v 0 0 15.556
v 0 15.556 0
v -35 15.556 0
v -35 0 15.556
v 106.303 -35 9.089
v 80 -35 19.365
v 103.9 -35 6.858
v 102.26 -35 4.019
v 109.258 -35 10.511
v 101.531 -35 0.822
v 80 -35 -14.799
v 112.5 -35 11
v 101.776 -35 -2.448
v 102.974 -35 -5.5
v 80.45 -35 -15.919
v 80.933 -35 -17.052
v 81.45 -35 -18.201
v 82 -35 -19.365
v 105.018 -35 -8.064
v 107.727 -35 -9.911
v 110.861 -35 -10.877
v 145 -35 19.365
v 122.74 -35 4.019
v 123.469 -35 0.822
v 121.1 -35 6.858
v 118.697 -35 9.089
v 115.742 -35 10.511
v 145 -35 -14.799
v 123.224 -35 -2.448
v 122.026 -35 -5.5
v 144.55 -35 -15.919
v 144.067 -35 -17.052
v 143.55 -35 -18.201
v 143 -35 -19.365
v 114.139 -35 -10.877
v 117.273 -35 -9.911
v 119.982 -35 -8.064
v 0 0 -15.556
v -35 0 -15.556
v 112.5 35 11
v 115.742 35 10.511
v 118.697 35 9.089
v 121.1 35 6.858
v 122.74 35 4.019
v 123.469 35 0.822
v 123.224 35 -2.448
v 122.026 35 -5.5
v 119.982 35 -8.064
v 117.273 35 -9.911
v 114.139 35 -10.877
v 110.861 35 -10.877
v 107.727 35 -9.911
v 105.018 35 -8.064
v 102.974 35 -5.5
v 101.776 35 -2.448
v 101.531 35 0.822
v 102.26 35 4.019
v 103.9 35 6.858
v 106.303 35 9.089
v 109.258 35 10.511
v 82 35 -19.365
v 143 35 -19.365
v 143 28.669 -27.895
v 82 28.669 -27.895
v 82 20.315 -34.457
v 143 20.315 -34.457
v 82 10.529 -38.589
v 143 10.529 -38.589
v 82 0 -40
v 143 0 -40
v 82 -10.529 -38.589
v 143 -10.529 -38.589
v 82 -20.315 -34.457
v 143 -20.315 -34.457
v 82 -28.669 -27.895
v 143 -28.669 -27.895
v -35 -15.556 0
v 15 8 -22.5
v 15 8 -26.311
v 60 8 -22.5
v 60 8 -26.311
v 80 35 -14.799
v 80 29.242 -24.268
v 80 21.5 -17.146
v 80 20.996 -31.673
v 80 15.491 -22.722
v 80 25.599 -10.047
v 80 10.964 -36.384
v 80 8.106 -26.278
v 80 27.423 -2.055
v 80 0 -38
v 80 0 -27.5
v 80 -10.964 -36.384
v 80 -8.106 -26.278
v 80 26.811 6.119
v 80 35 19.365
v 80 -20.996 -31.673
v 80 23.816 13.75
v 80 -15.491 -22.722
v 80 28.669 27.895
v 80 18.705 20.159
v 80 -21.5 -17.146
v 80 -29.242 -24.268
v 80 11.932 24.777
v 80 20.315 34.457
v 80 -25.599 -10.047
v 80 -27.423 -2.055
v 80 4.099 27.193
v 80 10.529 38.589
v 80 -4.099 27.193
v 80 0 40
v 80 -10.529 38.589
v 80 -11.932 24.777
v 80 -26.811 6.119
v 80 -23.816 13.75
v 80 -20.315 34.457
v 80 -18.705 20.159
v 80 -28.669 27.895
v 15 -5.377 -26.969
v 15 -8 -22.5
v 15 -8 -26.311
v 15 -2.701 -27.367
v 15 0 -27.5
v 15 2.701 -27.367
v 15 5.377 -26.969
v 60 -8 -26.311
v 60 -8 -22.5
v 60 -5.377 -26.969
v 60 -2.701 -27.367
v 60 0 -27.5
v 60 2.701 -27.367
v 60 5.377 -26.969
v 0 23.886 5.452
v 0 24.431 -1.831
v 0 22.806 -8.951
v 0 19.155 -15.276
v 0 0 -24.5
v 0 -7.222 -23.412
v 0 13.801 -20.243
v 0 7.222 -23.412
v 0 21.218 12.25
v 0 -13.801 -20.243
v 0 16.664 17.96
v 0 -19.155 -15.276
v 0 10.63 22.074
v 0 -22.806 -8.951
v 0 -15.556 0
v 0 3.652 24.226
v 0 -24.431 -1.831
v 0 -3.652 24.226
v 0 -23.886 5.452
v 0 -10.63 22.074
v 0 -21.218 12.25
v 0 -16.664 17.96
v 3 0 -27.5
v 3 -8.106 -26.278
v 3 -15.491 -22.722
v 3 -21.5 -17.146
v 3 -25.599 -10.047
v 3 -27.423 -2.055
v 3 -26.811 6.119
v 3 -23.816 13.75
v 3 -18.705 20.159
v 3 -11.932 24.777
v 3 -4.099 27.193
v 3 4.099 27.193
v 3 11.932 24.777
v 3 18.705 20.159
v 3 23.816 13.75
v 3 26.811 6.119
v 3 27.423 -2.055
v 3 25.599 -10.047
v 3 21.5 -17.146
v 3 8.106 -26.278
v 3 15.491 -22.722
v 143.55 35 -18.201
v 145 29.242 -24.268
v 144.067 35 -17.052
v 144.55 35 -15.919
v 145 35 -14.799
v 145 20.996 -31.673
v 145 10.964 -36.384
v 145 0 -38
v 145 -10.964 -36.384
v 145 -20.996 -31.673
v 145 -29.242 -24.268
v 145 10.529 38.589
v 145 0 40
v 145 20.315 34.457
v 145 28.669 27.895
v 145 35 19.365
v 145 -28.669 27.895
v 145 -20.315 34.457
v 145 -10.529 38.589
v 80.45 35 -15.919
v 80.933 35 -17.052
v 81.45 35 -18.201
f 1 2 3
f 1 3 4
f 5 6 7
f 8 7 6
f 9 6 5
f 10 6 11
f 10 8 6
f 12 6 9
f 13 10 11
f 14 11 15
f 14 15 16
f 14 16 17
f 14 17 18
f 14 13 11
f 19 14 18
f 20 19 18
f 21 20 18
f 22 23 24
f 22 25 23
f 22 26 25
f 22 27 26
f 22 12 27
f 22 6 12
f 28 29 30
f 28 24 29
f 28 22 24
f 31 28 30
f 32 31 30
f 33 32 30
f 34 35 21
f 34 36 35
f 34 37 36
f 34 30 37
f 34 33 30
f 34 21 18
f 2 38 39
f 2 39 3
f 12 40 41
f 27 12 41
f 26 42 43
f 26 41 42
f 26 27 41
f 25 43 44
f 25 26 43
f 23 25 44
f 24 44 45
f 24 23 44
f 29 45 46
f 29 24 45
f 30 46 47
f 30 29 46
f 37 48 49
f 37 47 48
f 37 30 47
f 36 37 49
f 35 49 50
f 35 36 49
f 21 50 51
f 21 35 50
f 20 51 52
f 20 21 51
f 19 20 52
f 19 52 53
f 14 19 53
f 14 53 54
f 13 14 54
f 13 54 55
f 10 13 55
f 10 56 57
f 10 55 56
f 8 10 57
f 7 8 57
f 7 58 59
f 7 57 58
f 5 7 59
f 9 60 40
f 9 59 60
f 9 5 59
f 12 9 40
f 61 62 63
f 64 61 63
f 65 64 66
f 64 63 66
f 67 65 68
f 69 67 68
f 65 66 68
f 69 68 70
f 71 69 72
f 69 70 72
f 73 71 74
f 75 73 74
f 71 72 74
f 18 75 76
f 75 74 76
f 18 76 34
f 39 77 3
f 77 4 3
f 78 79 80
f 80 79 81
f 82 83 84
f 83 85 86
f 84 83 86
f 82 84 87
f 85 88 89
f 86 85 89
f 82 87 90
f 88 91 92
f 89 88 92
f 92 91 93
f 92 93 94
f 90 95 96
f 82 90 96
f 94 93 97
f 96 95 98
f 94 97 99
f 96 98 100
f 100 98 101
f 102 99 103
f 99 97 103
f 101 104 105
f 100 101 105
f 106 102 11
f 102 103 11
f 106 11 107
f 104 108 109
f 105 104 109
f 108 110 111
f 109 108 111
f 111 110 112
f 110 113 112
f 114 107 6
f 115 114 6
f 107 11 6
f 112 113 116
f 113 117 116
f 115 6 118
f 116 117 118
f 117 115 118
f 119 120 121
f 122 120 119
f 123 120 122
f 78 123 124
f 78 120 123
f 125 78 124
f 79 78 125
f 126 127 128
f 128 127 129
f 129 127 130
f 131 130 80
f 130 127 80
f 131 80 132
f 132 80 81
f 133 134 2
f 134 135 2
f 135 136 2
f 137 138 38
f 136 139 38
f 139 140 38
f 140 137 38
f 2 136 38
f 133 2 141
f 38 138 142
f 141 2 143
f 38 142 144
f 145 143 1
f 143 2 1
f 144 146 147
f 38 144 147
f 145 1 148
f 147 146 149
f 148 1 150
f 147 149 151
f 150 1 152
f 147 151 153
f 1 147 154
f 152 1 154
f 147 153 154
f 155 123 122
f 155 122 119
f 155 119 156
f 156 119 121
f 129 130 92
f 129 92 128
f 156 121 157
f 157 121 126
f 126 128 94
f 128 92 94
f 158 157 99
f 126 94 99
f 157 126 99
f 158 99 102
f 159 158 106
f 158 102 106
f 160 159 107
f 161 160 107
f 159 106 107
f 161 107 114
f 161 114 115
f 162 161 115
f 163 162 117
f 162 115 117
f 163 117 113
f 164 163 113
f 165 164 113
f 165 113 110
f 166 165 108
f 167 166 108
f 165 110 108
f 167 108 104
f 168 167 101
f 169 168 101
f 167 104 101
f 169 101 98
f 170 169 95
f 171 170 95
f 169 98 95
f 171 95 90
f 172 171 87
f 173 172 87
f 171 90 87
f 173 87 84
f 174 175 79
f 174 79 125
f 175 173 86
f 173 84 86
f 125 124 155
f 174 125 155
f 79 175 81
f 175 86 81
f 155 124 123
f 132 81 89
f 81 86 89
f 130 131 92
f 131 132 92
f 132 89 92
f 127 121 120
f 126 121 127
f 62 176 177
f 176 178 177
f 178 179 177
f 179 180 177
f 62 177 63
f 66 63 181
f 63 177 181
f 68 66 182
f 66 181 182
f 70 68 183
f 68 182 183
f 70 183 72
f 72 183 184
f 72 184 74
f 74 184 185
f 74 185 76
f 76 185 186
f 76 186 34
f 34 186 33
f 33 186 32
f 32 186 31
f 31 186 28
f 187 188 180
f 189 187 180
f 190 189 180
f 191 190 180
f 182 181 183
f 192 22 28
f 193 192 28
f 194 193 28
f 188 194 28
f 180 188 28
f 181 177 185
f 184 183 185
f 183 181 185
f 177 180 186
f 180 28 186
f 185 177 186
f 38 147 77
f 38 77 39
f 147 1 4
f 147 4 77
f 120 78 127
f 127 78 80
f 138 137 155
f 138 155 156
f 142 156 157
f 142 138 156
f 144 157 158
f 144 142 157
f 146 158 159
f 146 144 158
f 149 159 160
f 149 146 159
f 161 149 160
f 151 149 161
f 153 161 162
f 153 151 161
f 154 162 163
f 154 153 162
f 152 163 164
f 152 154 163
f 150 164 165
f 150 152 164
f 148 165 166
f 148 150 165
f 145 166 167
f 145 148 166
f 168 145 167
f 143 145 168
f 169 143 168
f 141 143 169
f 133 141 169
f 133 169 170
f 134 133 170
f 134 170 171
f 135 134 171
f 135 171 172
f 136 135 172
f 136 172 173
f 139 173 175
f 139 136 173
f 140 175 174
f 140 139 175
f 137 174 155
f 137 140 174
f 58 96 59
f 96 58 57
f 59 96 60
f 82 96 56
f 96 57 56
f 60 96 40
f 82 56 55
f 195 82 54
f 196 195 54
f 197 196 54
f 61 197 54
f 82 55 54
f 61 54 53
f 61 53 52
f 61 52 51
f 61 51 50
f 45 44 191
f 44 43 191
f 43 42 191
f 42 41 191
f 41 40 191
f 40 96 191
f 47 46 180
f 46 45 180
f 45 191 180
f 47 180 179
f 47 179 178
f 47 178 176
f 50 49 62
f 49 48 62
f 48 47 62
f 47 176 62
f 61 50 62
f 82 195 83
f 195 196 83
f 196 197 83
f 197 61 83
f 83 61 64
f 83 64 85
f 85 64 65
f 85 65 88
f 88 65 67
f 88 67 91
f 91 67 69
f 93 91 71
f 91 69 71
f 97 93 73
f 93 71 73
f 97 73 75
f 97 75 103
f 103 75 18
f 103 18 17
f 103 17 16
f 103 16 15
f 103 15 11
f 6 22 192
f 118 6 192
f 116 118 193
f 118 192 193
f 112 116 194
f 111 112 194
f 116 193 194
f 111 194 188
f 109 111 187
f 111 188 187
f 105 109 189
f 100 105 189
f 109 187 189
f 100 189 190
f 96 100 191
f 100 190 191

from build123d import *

# Parameters (mm, degrees)
EXTRUDE_1_DEPTH          = 35
SKETCH_4_W               = 45
SKETCH_4_H               = 5
CUT_EXTRUDE_1_DEPTH      = 8
CUT_EXTRUDE_2_DEPTH      = 189.679622641
CUT_EXTRUDE_3_DEPTH      = 166.90660023
CUT_EXTRUDE_3_DEPTH_BACK = 166.90660023
SKETCH_6_R               = 11
CHAMFER_1_SIZE           = 2
CHAMFER_2_SIZE           = 3


with BuildPart() as part:
    # Эскиз1 → Повернуть1 (revolve)
    with BuildSketch(Plane.XY, mode=Mode.PRIVATE) as revolve_1_sk:
        Polygon((0, 0), (0, 27.5), (80, 27.5), (80, 40), (145, 40), (145, 0), align=None)
    revolve(revolve_1_sk.sketch.rotate(Axis((0, 0, 0), (-1, 0, 0)), 90), axis=Axis((0, 0, 0), (-1, 0, 0)))

    # Эскиз3 → Бобышка-Вытянуть1 (add)
    with BuildSketch(Plane.ZY):
        Polygon((0, -15.556349186), (-15.556349186, 0), (0, 15.556349186), (15.556349186, 0), align=None)
    extrude(amount=EXTRUDE_1_DEPTH)

    # Эскиз4 → Вырез-Вытянуть1 (cut, symmetric)
    with BuildSketch(Plane(origin=(0, 0, 0), x_dir=(1, 0, 0), z_dir=(0, 1, 0))):
        with Locations((37.5, 25)):
            Rectangle(SKETCH_4_W, SKETCH_4_H)
    extrude(amount=CUT_EXTRUDE_1_DEPTH, both=True, mode=Mode.SUBTRACT)

    # Эскиз5 → Вырез-Вытянуть2 (cut, symmetric)
    with BuildSketch(Plane(origin=(145, 0, 0), x_dir=(0, 0, -1), z_dir=(1, 0, 0))):
        Polygon((-220.667748268, 35), (-19.364916731, 35), (19.364916731, 35), (220.667748268, 35), (220.667748268, 437.605663073), (-220.667748268, 437.605663073), align=None)
    cut_extrude_2 = extrude(amount=CUT_EXTRUDE_2_DEPTH, both=True, mode=Mode.SUBTRACT)

    # Зеркальное отражение1: Вырез-Вытянуть2 across plane
    add(cut_extrude_2.mirror(Plane.ZX), mode=Mode.SUBTRACT)

    # Эскиз6 → Вырез-Вытянуть3 (cut, two sides: drawn at the far end of the back side and taken through both)
    with BuildSketch(Plane(origin=(0, 35, 0), x_dir=(1, 0, 0), z_dir=(0, 1, 0)).offset(-CUT_EXTRUDE_3_DEPTH_BACK)):
        with Locations(Location((112.5, 0, 0), (0, 0, 270))):
            Circle(SKETCH_6_R)
    extrude(amount=CUT_EXTRUDE_3_DEPTH + CUT_EXTRUDE_3_DEPTH_BACK, mode=Mode.SUBTRACT)

    # Фаска1
    chamfer_1_edges = [part.edges().sort_by_distance(p)[0] for p in [
        (145, 0, -40),
        (80, 0, -40),
    ]]
    chamfer(chamfer_1_edges, length=CHAMFER_1_SIZE)

    # Фаска2
    chamfer_2_edges = [part.edges().sort_by_distance(p)[0] for p in [
        (0, 0, 27.5),
    ]]
    chamfer(chamfer_2_edges, length=CHAMFER_2_SIZE)


solid = part.part
